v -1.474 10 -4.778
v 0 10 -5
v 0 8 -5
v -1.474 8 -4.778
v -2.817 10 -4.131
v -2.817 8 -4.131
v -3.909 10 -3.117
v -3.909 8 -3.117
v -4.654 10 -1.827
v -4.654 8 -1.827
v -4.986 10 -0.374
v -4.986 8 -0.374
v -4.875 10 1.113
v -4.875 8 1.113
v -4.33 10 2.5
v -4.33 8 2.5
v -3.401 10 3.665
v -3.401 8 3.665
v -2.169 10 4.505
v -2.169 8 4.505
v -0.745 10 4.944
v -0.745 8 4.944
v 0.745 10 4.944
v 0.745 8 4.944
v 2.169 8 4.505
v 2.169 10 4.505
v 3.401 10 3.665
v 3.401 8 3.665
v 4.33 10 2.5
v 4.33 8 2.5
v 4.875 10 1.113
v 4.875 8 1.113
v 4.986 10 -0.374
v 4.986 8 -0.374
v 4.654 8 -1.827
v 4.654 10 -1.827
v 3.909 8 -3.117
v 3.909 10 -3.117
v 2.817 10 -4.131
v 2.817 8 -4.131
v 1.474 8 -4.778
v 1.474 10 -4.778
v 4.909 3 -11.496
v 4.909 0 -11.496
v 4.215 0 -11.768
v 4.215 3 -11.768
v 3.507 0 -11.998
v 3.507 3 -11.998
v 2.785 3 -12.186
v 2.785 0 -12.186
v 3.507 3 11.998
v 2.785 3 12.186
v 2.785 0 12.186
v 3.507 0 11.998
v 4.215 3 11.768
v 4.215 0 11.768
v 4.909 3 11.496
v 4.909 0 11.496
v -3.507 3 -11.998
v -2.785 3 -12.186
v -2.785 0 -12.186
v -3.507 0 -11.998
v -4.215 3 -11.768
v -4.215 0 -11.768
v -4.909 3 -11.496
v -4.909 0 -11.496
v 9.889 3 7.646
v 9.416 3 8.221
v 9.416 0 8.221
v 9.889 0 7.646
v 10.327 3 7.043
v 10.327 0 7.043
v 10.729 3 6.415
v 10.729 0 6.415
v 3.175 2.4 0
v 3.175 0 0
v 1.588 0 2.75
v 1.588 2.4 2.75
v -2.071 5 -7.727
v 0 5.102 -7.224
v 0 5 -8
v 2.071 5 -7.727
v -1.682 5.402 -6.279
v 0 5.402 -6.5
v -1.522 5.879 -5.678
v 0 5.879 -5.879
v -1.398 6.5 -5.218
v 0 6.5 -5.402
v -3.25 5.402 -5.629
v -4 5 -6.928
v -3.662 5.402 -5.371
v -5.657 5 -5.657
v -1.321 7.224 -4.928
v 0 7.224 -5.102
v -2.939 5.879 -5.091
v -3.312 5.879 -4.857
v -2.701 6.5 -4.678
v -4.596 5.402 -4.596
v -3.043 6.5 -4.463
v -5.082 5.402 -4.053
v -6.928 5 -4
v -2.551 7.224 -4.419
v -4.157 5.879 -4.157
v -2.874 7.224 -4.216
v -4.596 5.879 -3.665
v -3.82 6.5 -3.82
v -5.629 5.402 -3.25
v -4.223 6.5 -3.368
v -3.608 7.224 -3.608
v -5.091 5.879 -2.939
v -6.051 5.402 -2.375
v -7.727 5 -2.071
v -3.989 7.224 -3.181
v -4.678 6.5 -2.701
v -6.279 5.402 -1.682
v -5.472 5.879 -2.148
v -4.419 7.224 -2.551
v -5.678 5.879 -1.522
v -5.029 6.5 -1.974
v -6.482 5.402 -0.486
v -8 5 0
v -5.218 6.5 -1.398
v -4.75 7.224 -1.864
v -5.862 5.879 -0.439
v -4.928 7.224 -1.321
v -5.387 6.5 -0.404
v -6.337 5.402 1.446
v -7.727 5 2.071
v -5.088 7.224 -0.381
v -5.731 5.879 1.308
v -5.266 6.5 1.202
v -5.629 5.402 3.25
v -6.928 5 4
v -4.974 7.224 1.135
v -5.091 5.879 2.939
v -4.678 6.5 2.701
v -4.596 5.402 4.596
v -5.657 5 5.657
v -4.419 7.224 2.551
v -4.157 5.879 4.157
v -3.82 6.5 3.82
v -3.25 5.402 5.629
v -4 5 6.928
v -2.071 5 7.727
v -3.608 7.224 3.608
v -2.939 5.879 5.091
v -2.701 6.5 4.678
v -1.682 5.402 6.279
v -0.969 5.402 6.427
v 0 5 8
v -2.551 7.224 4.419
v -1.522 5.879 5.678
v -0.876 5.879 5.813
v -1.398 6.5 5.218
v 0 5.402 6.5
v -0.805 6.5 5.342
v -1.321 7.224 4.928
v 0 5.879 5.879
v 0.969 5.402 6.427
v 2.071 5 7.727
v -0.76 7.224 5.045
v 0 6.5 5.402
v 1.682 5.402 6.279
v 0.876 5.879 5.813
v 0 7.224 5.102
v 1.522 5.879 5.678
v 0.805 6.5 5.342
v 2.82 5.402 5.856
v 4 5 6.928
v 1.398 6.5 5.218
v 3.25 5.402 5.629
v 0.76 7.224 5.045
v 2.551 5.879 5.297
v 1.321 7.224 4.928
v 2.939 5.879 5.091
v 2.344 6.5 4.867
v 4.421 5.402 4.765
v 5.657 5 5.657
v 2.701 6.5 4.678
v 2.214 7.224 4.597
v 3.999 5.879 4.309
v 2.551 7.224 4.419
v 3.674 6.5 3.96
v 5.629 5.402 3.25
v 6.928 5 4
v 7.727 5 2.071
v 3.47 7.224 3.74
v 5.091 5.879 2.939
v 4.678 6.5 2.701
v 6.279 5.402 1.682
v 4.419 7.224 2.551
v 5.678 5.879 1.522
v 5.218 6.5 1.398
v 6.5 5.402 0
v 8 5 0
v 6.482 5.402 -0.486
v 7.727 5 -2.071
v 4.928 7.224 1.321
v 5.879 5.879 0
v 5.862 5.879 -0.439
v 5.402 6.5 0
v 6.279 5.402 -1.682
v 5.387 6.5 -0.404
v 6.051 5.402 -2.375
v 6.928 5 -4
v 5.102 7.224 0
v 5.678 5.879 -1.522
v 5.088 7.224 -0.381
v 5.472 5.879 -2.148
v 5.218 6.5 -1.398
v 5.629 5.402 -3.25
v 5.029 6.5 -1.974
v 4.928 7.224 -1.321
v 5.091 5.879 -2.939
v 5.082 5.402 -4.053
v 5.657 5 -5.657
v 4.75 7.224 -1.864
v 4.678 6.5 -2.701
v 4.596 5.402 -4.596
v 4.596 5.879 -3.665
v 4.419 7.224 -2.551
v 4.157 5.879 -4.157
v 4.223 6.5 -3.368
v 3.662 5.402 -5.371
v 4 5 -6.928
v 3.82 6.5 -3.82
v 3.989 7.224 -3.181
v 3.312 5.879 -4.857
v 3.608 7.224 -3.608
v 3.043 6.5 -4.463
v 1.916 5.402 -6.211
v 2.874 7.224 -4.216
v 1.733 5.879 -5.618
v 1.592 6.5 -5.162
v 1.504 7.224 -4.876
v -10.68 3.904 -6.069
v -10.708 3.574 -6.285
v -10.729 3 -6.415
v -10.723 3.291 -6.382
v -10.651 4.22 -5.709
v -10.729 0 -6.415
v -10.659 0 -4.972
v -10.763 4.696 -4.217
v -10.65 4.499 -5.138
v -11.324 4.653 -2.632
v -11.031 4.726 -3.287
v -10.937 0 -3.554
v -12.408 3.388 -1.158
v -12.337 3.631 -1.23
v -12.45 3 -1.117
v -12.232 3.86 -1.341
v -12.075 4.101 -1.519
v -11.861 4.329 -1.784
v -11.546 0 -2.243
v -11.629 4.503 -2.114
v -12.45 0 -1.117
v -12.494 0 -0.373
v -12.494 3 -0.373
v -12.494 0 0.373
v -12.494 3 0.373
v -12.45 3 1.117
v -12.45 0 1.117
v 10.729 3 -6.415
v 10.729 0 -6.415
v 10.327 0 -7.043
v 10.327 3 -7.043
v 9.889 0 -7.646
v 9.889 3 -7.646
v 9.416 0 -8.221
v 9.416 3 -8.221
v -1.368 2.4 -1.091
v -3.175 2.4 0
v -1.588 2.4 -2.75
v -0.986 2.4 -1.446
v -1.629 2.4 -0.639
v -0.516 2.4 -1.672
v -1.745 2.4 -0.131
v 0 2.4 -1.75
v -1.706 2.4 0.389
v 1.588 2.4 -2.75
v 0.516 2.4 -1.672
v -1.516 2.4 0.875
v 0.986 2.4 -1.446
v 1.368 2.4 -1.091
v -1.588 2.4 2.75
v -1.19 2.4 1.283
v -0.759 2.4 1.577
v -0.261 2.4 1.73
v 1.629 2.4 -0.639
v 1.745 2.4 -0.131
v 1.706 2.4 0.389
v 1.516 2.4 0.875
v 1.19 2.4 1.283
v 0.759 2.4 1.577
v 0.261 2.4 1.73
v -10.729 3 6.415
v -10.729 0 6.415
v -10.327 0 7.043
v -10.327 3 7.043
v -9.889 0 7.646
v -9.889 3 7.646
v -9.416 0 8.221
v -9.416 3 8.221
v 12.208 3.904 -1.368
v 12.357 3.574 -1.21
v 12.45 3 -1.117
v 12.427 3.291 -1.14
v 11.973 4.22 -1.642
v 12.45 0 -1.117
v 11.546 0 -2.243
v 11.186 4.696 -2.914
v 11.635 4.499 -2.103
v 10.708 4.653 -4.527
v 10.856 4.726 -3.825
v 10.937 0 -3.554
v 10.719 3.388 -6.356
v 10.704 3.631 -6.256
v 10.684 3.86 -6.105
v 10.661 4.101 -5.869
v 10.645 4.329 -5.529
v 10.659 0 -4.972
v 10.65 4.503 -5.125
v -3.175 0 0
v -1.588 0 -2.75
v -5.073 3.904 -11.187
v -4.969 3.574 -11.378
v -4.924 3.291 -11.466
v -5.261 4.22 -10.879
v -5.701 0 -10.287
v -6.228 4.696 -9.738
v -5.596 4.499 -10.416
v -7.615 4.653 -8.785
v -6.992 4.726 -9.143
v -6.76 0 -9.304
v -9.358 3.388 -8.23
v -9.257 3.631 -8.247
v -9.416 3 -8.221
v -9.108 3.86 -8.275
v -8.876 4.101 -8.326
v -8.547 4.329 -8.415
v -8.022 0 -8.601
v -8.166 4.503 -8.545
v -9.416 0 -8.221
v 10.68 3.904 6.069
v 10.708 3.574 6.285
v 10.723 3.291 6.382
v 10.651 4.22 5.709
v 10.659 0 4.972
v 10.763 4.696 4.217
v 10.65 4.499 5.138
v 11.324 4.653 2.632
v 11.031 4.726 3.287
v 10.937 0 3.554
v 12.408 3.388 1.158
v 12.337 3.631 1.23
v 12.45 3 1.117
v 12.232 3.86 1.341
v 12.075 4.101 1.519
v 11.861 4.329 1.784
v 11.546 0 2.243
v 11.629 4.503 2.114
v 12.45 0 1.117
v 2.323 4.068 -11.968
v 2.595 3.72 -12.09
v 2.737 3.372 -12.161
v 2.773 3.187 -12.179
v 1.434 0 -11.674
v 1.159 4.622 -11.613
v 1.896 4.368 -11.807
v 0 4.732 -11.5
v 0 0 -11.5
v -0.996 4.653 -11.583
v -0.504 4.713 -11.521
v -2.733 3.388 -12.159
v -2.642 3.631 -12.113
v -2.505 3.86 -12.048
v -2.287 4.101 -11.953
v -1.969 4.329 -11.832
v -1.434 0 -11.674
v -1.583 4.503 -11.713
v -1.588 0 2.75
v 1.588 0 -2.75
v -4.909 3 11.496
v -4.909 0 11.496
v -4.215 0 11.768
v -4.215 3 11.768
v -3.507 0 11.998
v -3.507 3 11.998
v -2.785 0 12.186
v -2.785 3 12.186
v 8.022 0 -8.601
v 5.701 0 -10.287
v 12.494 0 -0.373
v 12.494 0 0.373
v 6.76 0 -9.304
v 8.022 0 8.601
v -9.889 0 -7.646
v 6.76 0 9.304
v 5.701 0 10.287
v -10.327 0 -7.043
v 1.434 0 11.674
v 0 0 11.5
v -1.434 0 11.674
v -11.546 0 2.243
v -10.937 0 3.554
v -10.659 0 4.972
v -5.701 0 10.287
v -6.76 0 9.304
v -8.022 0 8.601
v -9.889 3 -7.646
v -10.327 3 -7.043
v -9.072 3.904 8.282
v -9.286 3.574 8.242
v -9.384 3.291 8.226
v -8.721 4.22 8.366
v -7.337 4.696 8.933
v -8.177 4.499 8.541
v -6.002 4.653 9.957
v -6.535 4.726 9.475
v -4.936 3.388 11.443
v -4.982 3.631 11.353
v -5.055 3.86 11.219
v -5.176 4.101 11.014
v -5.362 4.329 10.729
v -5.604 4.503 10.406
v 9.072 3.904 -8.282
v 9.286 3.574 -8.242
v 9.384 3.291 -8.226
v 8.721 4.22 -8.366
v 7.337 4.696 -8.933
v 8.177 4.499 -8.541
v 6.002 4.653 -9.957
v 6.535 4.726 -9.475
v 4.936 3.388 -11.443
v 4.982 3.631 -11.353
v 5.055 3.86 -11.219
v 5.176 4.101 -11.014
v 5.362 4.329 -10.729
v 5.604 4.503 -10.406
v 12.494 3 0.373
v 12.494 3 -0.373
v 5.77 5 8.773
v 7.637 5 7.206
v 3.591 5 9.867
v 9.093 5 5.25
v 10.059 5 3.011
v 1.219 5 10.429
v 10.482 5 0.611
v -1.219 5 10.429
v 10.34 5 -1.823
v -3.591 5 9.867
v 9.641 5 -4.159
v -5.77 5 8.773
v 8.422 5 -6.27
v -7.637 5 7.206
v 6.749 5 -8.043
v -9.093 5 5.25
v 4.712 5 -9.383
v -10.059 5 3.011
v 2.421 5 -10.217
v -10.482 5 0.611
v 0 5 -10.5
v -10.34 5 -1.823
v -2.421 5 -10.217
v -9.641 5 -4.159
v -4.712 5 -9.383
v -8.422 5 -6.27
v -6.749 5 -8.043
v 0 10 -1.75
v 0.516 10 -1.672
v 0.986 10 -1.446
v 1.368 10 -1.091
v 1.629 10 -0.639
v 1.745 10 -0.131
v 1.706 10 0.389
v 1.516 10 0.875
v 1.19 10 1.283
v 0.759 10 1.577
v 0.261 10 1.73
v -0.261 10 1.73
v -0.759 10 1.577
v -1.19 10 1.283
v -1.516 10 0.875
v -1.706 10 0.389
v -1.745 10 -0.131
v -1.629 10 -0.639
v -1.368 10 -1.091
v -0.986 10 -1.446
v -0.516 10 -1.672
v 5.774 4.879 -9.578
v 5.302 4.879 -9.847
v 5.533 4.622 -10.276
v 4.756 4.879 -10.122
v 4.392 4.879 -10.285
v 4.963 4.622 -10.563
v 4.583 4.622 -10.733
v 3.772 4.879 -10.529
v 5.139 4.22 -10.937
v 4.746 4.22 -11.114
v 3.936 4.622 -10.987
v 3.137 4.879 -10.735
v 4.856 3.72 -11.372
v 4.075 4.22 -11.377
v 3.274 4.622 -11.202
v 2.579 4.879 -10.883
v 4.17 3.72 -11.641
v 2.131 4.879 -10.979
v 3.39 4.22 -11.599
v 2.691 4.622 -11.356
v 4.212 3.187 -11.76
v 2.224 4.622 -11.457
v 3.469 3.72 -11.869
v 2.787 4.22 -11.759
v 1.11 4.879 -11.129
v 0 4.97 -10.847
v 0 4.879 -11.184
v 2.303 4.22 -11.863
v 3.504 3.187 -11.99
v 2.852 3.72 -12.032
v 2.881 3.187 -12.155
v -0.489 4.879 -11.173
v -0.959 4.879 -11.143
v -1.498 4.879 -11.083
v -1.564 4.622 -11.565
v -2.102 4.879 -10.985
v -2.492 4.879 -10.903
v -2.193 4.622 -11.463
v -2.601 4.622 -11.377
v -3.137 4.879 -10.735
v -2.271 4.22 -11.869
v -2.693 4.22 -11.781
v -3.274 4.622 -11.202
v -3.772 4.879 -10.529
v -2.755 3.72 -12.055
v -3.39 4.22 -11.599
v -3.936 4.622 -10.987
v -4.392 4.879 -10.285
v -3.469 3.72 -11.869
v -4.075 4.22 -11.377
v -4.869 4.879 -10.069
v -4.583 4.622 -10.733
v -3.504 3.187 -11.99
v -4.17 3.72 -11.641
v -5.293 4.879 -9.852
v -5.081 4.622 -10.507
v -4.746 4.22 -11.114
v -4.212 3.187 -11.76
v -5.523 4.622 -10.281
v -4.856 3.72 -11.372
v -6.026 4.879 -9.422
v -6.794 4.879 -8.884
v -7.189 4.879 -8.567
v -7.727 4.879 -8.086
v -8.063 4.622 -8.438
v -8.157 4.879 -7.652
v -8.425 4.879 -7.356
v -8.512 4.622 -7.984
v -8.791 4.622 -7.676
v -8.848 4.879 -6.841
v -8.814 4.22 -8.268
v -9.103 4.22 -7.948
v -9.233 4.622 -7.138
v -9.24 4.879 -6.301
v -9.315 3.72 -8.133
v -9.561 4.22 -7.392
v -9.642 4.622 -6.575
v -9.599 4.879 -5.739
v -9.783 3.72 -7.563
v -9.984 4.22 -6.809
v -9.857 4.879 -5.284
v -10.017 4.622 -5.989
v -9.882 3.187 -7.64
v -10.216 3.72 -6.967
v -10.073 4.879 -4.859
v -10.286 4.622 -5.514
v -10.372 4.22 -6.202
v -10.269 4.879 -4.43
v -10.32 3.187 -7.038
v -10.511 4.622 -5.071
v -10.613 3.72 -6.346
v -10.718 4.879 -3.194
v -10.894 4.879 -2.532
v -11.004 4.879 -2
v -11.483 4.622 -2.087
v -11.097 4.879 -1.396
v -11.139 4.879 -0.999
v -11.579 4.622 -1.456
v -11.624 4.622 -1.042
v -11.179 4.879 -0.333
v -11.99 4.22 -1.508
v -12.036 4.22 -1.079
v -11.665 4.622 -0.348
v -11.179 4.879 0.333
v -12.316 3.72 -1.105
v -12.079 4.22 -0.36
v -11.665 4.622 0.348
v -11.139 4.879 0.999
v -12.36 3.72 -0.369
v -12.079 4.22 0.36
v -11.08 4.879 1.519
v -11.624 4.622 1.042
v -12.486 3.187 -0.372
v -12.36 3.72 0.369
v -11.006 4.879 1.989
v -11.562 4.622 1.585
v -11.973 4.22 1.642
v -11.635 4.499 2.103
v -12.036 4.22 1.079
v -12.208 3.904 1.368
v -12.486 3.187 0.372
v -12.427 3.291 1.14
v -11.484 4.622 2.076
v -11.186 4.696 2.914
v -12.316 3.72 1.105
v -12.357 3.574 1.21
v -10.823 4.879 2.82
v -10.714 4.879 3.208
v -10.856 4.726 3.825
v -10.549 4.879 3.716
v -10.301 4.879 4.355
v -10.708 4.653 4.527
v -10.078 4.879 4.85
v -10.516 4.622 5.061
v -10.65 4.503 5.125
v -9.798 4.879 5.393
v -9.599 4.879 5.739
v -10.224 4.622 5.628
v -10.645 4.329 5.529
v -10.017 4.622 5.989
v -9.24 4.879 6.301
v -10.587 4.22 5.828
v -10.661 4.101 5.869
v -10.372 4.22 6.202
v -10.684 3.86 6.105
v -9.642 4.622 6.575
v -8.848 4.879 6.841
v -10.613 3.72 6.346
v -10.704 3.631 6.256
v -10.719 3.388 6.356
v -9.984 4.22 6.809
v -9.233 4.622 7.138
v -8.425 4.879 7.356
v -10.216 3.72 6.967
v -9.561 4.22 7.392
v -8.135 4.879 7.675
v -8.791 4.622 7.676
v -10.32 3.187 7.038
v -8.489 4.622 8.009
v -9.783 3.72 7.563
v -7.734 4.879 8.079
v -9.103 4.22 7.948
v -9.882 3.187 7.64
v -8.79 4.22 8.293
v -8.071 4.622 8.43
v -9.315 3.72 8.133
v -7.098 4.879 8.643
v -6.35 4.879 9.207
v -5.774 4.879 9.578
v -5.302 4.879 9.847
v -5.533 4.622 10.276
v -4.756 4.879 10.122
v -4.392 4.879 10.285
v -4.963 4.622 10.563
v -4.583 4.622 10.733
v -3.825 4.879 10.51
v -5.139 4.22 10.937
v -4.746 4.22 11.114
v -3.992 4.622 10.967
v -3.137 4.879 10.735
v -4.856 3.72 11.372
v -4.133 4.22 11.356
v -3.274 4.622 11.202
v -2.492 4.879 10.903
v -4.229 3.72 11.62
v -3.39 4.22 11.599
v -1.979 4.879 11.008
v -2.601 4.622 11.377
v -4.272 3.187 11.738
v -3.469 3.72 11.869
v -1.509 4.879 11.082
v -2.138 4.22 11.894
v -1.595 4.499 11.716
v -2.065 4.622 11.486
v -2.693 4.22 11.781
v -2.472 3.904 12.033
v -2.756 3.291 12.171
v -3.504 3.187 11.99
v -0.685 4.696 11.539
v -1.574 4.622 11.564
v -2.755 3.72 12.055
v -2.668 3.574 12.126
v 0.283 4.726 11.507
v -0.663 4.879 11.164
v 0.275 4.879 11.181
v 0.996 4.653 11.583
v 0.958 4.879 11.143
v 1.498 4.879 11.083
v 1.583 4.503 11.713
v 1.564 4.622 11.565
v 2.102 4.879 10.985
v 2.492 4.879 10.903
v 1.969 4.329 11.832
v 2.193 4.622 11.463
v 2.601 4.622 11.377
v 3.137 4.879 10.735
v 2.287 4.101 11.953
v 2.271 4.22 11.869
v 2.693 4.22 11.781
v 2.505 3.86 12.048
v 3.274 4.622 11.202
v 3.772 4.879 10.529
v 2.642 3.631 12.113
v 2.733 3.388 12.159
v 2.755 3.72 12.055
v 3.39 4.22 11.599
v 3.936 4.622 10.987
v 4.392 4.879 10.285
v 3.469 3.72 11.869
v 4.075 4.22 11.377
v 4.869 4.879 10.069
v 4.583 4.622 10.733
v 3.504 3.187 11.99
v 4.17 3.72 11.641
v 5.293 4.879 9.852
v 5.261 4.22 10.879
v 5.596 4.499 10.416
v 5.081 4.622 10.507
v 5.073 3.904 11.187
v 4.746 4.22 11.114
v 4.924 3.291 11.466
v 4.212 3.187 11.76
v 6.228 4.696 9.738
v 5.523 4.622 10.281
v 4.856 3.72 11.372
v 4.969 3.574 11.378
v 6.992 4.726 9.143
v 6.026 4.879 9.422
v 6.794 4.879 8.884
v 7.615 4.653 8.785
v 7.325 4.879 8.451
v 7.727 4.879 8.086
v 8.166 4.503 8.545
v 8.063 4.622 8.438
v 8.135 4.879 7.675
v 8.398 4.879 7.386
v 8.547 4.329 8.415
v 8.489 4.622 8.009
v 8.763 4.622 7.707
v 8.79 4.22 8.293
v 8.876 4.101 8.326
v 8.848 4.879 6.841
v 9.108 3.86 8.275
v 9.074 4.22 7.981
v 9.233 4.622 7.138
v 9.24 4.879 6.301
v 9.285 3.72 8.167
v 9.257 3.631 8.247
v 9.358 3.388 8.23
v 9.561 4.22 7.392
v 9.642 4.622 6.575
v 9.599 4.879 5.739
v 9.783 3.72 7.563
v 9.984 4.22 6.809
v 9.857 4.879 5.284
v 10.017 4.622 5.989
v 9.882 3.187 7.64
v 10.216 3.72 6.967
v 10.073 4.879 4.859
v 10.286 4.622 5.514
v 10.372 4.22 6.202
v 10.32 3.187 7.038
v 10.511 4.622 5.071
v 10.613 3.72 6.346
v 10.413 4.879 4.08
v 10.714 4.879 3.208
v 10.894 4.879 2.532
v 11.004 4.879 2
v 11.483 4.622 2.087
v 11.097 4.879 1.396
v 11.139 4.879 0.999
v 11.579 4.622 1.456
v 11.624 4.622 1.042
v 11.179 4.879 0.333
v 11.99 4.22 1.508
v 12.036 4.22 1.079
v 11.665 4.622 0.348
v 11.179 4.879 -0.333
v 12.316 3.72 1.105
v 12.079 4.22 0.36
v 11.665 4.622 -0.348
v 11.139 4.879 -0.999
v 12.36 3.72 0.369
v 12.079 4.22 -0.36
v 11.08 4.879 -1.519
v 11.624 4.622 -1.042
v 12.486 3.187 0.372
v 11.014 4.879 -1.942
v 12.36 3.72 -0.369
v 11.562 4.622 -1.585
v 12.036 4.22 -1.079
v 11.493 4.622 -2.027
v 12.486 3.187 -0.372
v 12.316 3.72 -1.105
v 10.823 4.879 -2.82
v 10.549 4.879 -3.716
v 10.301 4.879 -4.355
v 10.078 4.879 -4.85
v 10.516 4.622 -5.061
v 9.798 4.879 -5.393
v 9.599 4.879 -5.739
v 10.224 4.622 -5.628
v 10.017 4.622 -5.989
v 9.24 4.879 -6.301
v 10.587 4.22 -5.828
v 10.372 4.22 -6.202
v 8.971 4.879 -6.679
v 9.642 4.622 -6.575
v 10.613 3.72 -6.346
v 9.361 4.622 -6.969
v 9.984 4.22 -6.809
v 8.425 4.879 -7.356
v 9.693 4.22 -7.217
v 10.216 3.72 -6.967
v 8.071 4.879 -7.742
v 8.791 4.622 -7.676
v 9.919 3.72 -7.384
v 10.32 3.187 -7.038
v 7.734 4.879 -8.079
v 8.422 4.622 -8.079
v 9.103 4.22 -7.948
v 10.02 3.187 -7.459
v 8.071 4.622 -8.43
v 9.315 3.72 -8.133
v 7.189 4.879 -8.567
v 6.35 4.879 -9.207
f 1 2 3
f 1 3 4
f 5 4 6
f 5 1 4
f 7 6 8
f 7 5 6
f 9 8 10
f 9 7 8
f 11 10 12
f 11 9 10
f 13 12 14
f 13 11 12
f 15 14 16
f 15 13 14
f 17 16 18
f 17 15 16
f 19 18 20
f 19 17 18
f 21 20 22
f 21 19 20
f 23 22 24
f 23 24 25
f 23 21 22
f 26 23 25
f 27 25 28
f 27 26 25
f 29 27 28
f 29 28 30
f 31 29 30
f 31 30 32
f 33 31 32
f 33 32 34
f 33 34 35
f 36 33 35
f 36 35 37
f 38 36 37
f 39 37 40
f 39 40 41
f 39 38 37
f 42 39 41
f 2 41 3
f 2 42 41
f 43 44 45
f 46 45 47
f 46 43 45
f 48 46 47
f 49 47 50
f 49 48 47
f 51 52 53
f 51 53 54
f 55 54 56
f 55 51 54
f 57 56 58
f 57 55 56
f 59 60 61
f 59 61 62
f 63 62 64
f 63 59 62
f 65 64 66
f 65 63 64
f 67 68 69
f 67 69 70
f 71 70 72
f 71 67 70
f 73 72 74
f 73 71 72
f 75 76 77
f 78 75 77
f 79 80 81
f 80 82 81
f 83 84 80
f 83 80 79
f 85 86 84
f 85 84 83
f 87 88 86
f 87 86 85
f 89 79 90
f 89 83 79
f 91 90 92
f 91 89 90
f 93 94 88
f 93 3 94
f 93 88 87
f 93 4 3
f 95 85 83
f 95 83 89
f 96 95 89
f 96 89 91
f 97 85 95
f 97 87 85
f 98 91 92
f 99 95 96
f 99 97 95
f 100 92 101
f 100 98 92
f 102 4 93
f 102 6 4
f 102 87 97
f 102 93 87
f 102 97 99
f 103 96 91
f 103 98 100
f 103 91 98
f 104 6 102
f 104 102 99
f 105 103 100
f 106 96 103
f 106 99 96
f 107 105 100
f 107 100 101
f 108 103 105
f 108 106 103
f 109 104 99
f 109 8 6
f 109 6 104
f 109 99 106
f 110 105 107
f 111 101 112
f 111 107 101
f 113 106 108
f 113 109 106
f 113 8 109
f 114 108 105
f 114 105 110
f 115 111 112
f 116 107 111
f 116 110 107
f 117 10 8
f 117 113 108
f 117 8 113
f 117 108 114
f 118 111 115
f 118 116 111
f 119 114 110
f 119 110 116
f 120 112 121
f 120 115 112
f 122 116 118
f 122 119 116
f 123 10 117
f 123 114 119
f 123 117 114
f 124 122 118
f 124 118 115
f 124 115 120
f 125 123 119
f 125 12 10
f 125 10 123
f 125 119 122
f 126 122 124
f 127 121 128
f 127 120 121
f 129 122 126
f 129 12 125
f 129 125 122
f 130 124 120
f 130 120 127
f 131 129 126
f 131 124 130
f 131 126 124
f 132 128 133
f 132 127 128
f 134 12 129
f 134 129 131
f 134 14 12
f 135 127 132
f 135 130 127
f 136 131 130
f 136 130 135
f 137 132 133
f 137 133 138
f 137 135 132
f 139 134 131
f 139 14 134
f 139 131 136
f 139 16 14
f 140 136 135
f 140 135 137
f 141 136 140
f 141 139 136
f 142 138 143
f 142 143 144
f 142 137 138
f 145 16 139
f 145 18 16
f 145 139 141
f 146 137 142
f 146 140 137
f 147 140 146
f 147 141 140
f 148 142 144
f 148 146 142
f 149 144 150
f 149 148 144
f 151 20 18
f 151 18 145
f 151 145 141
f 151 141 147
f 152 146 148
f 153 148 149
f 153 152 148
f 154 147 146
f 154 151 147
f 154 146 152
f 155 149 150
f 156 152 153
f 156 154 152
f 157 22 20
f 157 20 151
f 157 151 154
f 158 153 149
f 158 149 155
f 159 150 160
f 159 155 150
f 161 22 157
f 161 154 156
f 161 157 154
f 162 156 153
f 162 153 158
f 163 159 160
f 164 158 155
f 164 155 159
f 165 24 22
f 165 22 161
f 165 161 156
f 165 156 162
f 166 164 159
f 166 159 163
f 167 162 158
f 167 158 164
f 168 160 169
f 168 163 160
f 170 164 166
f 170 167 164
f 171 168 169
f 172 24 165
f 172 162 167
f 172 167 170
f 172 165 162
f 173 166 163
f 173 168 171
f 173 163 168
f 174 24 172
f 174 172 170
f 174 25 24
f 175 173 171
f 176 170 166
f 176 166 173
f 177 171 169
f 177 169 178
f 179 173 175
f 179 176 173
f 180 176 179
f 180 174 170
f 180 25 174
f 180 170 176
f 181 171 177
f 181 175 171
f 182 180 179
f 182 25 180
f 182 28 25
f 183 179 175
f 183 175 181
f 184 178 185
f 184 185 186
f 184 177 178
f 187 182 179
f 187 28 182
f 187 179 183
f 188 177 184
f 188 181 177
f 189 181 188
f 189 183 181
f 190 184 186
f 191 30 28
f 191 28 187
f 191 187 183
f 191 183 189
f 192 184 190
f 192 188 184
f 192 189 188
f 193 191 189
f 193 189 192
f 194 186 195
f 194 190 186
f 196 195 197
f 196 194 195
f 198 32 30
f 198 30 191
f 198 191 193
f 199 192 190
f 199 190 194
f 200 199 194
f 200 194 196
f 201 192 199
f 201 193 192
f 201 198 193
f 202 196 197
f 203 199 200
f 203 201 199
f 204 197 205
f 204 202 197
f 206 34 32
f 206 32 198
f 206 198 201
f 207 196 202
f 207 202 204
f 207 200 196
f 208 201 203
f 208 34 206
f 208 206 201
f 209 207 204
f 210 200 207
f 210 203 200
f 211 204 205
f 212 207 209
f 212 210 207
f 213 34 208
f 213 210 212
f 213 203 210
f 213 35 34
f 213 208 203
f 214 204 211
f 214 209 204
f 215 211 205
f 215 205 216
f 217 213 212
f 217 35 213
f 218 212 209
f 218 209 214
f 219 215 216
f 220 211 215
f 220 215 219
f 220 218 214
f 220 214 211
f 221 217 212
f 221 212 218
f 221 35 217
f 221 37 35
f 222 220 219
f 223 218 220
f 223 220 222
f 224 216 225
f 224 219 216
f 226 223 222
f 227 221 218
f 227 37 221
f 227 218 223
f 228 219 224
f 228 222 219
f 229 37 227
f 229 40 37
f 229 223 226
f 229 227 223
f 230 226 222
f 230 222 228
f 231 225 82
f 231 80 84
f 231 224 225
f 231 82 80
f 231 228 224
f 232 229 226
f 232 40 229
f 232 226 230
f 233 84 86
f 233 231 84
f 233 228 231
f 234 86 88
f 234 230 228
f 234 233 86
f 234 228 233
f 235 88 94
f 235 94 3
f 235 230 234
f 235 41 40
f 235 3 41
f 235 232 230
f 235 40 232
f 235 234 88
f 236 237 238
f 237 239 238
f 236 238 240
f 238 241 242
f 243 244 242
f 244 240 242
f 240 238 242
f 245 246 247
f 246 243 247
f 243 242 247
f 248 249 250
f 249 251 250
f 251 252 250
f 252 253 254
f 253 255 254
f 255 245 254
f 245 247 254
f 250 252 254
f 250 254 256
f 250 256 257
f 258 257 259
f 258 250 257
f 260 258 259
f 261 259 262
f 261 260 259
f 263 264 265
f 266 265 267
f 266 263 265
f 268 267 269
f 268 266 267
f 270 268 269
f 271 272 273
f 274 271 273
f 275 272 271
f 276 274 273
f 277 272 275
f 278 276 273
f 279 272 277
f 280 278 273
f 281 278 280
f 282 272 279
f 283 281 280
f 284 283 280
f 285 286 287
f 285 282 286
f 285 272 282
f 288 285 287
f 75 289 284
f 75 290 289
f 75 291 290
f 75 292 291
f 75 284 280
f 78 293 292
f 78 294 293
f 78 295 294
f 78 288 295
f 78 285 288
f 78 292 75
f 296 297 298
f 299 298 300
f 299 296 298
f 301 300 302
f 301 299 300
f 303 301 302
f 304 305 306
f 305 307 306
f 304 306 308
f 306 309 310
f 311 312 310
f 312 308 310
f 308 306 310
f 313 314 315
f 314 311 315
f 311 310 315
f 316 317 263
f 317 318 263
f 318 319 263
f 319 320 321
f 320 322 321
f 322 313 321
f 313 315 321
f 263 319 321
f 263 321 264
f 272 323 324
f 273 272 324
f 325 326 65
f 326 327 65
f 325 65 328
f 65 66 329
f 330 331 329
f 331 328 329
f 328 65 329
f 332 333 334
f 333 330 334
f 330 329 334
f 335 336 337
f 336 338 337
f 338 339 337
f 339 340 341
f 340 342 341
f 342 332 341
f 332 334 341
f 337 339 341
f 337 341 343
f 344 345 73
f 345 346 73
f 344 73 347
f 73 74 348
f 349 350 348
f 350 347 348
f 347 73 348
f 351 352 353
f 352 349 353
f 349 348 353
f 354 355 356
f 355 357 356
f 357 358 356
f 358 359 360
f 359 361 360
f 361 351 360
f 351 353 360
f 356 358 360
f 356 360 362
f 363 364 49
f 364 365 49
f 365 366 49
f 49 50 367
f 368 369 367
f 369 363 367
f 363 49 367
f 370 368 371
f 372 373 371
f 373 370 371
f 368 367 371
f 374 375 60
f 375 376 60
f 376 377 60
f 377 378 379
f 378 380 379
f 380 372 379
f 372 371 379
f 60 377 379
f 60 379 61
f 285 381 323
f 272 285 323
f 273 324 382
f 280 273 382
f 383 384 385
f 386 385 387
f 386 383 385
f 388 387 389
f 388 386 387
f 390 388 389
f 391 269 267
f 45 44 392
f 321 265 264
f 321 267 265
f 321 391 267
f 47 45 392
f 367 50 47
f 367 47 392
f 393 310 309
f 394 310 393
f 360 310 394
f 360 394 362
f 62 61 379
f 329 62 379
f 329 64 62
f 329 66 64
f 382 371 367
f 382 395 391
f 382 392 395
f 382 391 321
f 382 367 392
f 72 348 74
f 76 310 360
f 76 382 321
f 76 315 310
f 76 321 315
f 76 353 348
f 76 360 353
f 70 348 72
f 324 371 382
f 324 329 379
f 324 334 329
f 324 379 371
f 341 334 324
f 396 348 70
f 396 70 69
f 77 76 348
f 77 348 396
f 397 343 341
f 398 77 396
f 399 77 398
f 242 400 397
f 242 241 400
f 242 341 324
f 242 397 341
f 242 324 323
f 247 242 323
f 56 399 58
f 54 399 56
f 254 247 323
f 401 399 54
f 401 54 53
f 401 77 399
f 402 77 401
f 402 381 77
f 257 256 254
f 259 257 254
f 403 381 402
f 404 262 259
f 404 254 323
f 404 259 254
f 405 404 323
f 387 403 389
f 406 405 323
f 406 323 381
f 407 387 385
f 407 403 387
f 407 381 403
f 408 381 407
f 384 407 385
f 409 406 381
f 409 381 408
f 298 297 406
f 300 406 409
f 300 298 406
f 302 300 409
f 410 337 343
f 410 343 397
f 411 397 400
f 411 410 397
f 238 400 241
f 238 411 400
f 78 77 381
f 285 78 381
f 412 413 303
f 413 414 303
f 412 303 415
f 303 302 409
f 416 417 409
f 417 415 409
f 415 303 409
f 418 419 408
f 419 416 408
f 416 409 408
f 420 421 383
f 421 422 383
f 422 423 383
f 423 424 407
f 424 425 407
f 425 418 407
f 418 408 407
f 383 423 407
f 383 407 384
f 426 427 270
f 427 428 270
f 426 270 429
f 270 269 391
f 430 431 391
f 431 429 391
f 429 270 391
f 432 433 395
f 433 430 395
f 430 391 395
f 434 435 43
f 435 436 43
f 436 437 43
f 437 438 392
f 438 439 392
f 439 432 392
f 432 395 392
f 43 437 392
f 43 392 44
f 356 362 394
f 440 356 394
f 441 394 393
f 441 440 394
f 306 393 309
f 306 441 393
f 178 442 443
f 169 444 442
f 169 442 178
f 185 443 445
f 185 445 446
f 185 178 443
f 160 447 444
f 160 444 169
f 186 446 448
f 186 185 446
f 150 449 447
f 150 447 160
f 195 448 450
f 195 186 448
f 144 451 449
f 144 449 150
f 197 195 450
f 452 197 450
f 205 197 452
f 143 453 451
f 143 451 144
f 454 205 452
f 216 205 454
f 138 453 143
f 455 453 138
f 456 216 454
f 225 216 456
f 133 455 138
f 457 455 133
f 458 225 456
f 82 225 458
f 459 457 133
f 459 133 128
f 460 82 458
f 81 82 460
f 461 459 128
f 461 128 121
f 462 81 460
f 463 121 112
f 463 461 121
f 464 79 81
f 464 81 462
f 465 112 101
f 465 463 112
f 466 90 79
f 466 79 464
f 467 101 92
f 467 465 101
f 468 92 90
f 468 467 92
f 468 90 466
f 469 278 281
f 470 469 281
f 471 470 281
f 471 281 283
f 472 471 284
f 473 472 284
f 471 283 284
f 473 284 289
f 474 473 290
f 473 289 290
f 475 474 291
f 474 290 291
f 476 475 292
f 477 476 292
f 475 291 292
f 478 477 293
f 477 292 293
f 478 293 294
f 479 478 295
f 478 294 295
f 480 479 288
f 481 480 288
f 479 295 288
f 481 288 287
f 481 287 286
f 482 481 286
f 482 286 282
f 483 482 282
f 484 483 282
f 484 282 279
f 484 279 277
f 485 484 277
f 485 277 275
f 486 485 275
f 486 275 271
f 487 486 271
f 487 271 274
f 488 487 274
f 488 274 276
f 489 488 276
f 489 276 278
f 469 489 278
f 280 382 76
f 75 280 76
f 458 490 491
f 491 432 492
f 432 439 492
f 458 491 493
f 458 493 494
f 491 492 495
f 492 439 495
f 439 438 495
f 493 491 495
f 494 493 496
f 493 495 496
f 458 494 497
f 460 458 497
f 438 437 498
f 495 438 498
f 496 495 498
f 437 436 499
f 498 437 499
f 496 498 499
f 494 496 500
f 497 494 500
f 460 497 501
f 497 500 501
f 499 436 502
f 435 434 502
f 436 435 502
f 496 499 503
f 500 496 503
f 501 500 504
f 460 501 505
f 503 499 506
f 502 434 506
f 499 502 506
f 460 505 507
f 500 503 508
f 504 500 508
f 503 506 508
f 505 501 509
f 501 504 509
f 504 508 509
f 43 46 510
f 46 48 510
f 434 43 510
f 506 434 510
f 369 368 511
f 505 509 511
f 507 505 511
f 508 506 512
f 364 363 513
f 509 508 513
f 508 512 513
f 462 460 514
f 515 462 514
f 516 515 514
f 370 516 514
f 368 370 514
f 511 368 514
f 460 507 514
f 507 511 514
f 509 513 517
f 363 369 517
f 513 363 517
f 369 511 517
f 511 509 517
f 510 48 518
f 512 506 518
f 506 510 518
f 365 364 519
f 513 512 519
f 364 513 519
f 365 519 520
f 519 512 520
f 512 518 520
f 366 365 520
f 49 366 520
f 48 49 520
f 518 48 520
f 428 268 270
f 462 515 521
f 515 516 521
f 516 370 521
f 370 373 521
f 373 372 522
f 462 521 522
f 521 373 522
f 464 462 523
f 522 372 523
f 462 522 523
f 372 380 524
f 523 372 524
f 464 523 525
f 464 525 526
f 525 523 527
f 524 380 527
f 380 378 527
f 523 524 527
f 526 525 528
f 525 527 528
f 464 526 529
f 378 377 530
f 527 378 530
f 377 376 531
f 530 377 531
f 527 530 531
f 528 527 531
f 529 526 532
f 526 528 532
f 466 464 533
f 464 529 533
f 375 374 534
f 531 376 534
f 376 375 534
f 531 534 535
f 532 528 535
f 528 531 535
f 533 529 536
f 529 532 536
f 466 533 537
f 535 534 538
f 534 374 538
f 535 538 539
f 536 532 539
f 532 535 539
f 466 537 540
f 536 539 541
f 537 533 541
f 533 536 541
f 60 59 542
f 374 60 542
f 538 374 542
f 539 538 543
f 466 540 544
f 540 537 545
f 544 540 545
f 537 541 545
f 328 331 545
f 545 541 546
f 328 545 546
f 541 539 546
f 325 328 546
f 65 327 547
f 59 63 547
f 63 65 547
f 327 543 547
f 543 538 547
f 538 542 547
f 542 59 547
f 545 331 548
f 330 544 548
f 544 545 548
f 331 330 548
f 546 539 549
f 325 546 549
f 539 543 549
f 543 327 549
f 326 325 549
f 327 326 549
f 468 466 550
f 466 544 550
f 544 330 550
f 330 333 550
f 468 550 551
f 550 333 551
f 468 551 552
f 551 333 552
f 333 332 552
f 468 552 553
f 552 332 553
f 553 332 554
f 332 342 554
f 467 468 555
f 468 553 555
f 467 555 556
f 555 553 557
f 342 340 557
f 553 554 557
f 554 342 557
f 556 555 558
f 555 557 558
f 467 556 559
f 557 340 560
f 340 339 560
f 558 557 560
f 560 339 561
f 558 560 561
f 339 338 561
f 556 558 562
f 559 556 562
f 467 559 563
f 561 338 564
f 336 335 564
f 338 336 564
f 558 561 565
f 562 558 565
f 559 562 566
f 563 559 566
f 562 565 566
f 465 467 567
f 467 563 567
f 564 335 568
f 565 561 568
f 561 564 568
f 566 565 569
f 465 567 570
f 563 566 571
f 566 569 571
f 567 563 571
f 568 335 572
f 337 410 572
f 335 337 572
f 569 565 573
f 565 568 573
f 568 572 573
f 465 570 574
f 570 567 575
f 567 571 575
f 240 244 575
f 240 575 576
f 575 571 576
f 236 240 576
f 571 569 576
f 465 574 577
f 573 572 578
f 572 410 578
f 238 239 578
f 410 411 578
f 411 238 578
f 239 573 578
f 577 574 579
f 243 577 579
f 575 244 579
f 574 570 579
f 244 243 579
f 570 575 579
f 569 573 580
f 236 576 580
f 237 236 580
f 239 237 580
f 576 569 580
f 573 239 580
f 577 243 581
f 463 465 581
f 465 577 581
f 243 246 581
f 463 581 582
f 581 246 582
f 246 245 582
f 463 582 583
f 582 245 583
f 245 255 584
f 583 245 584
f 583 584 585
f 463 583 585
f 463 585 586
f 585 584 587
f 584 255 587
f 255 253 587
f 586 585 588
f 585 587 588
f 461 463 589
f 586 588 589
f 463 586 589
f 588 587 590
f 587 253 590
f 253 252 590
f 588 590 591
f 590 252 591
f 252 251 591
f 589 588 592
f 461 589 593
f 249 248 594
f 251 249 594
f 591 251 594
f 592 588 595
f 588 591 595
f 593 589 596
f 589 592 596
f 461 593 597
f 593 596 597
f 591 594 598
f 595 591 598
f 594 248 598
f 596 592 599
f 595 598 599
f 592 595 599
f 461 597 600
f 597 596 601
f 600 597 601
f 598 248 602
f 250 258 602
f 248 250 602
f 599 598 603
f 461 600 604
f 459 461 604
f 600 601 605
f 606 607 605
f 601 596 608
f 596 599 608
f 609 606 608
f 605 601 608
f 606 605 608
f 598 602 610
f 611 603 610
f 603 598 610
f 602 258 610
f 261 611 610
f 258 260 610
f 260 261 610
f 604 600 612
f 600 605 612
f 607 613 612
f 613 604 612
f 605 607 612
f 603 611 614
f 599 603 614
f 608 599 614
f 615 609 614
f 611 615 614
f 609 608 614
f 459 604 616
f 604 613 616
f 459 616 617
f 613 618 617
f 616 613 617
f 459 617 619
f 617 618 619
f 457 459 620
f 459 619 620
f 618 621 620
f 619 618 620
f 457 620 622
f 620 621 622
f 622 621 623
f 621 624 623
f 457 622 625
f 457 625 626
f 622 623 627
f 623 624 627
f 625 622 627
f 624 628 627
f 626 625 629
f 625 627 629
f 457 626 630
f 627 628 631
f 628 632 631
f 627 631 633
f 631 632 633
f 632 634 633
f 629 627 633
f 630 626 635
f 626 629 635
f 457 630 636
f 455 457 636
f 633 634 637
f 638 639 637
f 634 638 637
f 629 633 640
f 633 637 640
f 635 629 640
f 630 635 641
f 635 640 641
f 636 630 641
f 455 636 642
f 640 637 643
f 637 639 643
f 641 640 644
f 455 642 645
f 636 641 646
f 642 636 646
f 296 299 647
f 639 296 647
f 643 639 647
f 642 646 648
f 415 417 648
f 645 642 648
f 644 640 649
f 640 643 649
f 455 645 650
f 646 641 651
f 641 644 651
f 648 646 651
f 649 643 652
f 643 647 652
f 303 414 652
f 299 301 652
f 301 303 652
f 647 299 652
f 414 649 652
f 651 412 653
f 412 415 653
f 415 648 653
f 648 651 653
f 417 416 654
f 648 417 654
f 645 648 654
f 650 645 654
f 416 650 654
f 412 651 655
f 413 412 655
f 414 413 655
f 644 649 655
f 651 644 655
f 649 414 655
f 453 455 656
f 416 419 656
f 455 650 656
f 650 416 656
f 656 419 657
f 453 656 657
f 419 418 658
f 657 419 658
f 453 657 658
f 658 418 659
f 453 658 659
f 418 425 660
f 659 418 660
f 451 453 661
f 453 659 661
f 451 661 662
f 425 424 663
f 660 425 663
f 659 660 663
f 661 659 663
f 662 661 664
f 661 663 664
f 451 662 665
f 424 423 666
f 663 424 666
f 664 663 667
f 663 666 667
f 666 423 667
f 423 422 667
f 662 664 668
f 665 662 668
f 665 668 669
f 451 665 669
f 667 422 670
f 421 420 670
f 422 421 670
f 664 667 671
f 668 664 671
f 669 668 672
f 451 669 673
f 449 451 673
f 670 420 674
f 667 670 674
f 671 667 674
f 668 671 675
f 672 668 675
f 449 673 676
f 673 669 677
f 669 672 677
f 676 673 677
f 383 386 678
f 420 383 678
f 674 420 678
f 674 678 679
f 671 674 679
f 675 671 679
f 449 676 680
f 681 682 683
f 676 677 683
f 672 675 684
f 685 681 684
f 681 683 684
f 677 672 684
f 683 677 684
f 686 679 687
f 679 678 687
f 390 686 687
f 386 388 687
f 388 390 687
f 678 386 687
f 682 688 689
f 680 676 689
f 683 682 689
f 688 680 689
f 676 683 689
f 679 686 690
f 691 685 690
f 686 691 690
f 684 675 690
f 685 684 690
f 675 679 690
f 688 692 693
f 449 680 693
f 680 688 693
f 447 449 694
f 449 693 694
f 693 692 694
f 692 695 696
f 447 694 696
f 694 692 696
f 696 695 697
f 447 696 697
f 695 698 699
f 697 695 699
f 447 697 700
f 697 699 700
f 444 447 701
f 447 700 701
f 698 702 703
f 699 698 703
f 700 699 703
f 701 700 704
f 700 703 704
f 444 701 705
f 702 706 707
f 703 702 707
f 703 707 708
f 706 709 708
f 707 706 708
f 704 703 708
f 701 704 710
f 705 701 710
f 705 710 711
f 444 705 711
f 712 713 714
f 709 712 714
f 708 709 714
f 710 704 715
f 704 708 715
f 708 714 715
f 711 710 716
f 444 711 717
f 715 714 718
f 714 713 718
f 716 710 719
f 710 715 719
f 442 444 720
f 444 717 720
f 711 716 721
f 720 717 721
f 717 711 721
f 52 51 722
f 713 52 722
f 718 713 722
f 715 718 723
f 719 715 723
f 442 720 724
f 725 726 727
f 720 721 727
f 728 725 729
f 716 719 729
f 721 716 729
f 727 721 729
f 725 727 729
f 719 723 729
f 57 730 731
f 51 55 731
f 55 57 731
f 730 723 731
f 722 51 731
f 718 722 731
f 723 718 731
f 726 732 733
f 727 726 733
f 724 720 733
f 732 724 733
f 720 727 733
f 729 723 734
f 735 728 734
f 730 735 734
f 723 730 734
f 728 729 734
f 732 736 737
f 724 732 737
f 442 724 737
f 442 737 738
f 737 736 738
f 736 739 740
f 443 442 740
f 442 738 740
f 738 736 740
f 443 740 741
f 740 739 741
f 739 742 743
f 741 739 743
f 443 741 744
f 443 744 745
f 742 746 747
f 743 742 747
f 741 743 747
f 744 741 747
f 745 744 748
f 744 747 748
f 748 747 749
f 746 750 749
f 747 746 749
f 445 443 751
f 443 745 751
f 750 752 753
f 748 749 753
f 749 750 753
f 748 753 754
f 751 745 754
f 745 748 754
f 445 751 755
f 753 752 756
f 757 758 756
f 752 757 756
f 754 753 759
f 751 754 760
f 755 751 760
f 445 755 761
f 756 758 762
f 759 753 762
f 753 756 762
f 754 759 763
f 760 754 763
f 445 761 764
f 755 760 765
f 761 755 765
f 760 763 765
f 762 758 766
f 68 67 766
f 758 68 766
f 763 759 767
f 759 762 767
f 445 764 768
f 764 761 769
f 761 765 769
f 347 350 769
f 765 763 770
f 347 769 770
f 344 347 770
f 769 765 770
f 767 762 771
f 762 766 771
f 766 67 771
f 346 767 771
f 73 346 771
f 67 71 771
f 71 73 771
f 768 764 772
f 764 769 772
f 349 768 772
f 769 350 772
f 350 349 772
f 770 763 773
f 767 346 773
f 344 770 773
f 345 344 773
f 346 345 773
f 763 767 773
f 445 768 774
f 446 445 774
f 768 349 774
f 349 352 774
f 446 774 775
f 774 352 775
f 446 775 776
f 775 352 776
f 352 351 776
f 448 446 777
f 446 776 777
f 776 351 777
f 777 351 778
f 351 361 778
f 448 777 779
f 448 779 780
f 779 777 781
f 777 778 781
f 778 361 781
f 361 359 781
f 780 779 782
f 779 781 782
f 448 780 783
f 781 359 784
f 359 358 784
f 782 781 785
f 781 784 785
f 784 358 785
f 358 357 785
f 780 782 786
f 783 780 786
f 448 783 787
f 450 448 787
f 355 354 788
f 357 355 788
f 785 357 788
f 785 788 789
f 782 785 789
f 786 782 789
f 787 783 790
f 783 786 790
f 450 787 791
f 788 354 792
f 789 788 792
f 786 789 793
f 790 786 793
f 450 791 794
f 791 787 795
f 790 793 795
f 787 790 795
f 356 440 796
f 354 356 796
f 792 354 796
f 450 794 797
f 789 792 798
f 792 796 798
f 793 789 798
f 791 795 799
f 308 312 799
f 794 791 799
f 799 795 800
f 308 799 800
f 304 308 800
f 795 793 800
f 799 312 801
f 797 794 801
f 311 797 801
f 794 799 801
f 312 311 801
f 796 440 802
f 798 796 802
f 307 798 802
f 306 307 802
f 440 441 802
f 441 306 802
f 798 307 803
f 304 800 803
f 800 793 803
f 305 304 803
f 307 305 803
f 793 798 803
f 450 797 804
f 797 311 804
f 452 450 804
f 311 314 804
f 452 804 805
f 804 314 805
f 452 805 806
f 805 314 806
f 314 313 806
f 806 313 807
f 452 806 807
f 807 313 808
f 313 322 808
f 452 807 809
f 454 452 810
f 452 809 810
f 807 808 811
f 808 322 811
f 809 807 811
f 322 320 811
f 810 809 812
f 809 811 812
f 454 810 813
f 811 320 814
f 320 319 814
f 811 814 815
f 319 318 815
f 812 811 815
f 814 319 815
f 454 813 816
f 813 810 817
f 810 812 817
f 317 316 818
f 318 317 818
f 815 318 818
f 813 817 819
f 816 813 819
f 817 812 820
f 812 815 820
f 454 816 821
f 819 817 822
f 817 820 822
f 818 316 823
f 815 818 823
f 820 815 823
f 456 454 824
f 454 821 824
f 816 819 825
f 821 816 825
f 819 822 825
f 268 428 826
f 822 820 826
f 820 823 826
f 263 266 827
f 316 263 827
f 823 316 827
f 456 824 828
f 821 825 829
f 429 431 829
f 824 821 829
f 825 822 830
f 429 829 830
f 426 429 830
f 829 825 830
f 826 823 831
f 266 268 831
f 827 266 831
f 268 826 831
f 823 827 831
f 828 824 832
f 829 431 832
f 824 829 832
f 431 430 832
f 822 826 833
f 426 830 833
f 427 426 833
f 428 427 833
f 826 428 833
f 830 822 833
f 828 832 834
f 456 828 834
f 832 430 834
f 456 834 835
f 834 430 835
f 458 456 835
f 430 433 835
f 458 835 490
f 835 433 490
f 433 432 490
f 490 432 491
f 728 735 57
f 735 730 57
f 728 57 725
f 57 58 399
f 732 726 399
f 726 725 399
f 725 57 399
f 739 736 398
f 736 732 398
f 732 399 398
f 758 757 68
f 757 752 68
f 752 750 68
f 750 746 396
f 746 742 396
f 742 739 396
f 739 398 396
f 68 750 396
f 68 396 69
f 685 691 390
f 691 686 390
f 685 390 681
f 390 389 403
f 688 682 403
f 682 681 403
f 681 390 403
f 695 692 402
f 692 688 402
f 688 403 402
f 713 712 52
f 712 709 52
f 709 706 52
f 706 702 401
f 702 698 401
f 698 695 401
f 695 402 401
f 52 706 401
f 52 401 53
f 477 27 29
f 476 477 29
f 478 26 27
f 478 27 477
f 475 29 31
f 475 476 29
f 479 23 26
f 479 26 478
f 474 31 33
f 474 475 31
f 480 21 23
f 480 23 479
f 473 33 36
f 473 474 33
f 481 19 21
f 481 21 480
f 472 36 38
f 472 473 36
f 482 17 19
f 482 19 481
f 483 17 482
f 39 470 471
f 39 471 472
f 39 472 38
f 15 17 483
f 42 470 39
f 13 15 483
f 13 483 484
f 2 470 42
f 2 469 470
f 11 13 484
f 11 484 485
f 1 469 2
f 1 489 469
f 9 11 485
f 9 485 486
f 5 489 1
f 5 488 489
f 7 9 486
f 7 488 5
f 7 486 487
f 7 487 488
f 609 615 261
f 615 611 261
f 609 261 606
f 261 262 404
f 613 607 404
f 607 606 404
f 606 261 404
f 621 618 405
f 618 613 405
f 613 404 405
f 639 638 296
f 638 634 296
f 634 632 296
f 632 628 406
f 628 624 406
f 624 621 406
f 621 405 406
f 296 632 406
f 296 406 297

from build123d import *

# Parameters (mm, degrees)
FILETE1_R             = 3
FILETE2_R             = 2
ESBO_O2_R             = 6
CORTE_EXTRUS_O1_DEPTH = 5
PADR_OCIRCULAR1_COUNT = 10
ESBO_O3_R             = 1.75
CORTE_EXTRUS_O2_DEPTH = 10
CORTE_EXTRUS_O3_DEPTH = 2.4


with BuildPart() as part:
    # Esboço1 → Revolução1 (revolve)
    with BuildSketch(Plane.XY, mode=Mode.PRIVATE) as revolu_o1_sk:
        Polygon((0, 0), (12.5, 0), (12.5, 5), (5, 5), (5, 10), (0, 10), align=None)
    revolve(revolu_o1_sk.sketch.rotate(Axis((0, 0, 0), (0, 1, 0)), 90), axis=Axis((0, 0, 0), (0, 1, 0)))

    # Filete1
    filete1_edges = [part.edges().sort_by_distance(p)[0] for p in [
        (0, 5, 5),
    ]]
    fillet(filete1_edges, radius=FILETE1_R)

    # Filete2
    filete2_edges = [part.edges().sort_by_distance(p)[0] for p in [
        (0, 5, 12.5),
    ]]
    fillet(filete2_edges, radius=FILETE2_R)

    # Esboço2 → Corte-extrusão1 (cut)
    with BuildSketch(Plane.XZ):
        with Locations((0, 17.5)):
            Circle(ESBO_O2_R)
    corte_extrus_o1 = extrude(amount=-CORTE_EXTRUS_O1_DEPTH, mode=Mode.SUBTRACT)

    # PadrãoCircular1: Corte-extrusão1 ×10 about axis
    padr_ocircular1_axis = Axis((0, 0, 0), (0, 1, 0))
    for i in range(1, PADR_OCIRCULAR1_COUNT):
        add(corte_extrus_o1.rotate(padr_ocircular1_axis, i * 360 / PADR_OCIRCULAR1_COUNT), mode=Mode.SUBTRACT)

    # Esboço3 → Corte-extrusão2 (cut)
    with BuildSketch(Plane.XZ):
        with Locations(Location((0, 0, 0), (0, 0, 270))):
            Circle(ESBO_O3_R)
    extrude(amount=-CORTE_EXTRUS_O2_DEPTH, mode=Mode.SUBTRACT)

    # Esboço4 → Corte-extrusão3 (cut)
    with BuildSketch(Plane.XZ):
        Polygon((3.175426481, 0), (1.58771324, 2.75), (-1.58771324, 2.75), (-3.175426481, 0), (-1.58771324, -2.75), (1.58771324, -2.75), align=None)
    extrude(amount=-CORTE_EXTRUS_O3_DEPTH, mode=Mode.SUBTRACT)


solid = part.part
